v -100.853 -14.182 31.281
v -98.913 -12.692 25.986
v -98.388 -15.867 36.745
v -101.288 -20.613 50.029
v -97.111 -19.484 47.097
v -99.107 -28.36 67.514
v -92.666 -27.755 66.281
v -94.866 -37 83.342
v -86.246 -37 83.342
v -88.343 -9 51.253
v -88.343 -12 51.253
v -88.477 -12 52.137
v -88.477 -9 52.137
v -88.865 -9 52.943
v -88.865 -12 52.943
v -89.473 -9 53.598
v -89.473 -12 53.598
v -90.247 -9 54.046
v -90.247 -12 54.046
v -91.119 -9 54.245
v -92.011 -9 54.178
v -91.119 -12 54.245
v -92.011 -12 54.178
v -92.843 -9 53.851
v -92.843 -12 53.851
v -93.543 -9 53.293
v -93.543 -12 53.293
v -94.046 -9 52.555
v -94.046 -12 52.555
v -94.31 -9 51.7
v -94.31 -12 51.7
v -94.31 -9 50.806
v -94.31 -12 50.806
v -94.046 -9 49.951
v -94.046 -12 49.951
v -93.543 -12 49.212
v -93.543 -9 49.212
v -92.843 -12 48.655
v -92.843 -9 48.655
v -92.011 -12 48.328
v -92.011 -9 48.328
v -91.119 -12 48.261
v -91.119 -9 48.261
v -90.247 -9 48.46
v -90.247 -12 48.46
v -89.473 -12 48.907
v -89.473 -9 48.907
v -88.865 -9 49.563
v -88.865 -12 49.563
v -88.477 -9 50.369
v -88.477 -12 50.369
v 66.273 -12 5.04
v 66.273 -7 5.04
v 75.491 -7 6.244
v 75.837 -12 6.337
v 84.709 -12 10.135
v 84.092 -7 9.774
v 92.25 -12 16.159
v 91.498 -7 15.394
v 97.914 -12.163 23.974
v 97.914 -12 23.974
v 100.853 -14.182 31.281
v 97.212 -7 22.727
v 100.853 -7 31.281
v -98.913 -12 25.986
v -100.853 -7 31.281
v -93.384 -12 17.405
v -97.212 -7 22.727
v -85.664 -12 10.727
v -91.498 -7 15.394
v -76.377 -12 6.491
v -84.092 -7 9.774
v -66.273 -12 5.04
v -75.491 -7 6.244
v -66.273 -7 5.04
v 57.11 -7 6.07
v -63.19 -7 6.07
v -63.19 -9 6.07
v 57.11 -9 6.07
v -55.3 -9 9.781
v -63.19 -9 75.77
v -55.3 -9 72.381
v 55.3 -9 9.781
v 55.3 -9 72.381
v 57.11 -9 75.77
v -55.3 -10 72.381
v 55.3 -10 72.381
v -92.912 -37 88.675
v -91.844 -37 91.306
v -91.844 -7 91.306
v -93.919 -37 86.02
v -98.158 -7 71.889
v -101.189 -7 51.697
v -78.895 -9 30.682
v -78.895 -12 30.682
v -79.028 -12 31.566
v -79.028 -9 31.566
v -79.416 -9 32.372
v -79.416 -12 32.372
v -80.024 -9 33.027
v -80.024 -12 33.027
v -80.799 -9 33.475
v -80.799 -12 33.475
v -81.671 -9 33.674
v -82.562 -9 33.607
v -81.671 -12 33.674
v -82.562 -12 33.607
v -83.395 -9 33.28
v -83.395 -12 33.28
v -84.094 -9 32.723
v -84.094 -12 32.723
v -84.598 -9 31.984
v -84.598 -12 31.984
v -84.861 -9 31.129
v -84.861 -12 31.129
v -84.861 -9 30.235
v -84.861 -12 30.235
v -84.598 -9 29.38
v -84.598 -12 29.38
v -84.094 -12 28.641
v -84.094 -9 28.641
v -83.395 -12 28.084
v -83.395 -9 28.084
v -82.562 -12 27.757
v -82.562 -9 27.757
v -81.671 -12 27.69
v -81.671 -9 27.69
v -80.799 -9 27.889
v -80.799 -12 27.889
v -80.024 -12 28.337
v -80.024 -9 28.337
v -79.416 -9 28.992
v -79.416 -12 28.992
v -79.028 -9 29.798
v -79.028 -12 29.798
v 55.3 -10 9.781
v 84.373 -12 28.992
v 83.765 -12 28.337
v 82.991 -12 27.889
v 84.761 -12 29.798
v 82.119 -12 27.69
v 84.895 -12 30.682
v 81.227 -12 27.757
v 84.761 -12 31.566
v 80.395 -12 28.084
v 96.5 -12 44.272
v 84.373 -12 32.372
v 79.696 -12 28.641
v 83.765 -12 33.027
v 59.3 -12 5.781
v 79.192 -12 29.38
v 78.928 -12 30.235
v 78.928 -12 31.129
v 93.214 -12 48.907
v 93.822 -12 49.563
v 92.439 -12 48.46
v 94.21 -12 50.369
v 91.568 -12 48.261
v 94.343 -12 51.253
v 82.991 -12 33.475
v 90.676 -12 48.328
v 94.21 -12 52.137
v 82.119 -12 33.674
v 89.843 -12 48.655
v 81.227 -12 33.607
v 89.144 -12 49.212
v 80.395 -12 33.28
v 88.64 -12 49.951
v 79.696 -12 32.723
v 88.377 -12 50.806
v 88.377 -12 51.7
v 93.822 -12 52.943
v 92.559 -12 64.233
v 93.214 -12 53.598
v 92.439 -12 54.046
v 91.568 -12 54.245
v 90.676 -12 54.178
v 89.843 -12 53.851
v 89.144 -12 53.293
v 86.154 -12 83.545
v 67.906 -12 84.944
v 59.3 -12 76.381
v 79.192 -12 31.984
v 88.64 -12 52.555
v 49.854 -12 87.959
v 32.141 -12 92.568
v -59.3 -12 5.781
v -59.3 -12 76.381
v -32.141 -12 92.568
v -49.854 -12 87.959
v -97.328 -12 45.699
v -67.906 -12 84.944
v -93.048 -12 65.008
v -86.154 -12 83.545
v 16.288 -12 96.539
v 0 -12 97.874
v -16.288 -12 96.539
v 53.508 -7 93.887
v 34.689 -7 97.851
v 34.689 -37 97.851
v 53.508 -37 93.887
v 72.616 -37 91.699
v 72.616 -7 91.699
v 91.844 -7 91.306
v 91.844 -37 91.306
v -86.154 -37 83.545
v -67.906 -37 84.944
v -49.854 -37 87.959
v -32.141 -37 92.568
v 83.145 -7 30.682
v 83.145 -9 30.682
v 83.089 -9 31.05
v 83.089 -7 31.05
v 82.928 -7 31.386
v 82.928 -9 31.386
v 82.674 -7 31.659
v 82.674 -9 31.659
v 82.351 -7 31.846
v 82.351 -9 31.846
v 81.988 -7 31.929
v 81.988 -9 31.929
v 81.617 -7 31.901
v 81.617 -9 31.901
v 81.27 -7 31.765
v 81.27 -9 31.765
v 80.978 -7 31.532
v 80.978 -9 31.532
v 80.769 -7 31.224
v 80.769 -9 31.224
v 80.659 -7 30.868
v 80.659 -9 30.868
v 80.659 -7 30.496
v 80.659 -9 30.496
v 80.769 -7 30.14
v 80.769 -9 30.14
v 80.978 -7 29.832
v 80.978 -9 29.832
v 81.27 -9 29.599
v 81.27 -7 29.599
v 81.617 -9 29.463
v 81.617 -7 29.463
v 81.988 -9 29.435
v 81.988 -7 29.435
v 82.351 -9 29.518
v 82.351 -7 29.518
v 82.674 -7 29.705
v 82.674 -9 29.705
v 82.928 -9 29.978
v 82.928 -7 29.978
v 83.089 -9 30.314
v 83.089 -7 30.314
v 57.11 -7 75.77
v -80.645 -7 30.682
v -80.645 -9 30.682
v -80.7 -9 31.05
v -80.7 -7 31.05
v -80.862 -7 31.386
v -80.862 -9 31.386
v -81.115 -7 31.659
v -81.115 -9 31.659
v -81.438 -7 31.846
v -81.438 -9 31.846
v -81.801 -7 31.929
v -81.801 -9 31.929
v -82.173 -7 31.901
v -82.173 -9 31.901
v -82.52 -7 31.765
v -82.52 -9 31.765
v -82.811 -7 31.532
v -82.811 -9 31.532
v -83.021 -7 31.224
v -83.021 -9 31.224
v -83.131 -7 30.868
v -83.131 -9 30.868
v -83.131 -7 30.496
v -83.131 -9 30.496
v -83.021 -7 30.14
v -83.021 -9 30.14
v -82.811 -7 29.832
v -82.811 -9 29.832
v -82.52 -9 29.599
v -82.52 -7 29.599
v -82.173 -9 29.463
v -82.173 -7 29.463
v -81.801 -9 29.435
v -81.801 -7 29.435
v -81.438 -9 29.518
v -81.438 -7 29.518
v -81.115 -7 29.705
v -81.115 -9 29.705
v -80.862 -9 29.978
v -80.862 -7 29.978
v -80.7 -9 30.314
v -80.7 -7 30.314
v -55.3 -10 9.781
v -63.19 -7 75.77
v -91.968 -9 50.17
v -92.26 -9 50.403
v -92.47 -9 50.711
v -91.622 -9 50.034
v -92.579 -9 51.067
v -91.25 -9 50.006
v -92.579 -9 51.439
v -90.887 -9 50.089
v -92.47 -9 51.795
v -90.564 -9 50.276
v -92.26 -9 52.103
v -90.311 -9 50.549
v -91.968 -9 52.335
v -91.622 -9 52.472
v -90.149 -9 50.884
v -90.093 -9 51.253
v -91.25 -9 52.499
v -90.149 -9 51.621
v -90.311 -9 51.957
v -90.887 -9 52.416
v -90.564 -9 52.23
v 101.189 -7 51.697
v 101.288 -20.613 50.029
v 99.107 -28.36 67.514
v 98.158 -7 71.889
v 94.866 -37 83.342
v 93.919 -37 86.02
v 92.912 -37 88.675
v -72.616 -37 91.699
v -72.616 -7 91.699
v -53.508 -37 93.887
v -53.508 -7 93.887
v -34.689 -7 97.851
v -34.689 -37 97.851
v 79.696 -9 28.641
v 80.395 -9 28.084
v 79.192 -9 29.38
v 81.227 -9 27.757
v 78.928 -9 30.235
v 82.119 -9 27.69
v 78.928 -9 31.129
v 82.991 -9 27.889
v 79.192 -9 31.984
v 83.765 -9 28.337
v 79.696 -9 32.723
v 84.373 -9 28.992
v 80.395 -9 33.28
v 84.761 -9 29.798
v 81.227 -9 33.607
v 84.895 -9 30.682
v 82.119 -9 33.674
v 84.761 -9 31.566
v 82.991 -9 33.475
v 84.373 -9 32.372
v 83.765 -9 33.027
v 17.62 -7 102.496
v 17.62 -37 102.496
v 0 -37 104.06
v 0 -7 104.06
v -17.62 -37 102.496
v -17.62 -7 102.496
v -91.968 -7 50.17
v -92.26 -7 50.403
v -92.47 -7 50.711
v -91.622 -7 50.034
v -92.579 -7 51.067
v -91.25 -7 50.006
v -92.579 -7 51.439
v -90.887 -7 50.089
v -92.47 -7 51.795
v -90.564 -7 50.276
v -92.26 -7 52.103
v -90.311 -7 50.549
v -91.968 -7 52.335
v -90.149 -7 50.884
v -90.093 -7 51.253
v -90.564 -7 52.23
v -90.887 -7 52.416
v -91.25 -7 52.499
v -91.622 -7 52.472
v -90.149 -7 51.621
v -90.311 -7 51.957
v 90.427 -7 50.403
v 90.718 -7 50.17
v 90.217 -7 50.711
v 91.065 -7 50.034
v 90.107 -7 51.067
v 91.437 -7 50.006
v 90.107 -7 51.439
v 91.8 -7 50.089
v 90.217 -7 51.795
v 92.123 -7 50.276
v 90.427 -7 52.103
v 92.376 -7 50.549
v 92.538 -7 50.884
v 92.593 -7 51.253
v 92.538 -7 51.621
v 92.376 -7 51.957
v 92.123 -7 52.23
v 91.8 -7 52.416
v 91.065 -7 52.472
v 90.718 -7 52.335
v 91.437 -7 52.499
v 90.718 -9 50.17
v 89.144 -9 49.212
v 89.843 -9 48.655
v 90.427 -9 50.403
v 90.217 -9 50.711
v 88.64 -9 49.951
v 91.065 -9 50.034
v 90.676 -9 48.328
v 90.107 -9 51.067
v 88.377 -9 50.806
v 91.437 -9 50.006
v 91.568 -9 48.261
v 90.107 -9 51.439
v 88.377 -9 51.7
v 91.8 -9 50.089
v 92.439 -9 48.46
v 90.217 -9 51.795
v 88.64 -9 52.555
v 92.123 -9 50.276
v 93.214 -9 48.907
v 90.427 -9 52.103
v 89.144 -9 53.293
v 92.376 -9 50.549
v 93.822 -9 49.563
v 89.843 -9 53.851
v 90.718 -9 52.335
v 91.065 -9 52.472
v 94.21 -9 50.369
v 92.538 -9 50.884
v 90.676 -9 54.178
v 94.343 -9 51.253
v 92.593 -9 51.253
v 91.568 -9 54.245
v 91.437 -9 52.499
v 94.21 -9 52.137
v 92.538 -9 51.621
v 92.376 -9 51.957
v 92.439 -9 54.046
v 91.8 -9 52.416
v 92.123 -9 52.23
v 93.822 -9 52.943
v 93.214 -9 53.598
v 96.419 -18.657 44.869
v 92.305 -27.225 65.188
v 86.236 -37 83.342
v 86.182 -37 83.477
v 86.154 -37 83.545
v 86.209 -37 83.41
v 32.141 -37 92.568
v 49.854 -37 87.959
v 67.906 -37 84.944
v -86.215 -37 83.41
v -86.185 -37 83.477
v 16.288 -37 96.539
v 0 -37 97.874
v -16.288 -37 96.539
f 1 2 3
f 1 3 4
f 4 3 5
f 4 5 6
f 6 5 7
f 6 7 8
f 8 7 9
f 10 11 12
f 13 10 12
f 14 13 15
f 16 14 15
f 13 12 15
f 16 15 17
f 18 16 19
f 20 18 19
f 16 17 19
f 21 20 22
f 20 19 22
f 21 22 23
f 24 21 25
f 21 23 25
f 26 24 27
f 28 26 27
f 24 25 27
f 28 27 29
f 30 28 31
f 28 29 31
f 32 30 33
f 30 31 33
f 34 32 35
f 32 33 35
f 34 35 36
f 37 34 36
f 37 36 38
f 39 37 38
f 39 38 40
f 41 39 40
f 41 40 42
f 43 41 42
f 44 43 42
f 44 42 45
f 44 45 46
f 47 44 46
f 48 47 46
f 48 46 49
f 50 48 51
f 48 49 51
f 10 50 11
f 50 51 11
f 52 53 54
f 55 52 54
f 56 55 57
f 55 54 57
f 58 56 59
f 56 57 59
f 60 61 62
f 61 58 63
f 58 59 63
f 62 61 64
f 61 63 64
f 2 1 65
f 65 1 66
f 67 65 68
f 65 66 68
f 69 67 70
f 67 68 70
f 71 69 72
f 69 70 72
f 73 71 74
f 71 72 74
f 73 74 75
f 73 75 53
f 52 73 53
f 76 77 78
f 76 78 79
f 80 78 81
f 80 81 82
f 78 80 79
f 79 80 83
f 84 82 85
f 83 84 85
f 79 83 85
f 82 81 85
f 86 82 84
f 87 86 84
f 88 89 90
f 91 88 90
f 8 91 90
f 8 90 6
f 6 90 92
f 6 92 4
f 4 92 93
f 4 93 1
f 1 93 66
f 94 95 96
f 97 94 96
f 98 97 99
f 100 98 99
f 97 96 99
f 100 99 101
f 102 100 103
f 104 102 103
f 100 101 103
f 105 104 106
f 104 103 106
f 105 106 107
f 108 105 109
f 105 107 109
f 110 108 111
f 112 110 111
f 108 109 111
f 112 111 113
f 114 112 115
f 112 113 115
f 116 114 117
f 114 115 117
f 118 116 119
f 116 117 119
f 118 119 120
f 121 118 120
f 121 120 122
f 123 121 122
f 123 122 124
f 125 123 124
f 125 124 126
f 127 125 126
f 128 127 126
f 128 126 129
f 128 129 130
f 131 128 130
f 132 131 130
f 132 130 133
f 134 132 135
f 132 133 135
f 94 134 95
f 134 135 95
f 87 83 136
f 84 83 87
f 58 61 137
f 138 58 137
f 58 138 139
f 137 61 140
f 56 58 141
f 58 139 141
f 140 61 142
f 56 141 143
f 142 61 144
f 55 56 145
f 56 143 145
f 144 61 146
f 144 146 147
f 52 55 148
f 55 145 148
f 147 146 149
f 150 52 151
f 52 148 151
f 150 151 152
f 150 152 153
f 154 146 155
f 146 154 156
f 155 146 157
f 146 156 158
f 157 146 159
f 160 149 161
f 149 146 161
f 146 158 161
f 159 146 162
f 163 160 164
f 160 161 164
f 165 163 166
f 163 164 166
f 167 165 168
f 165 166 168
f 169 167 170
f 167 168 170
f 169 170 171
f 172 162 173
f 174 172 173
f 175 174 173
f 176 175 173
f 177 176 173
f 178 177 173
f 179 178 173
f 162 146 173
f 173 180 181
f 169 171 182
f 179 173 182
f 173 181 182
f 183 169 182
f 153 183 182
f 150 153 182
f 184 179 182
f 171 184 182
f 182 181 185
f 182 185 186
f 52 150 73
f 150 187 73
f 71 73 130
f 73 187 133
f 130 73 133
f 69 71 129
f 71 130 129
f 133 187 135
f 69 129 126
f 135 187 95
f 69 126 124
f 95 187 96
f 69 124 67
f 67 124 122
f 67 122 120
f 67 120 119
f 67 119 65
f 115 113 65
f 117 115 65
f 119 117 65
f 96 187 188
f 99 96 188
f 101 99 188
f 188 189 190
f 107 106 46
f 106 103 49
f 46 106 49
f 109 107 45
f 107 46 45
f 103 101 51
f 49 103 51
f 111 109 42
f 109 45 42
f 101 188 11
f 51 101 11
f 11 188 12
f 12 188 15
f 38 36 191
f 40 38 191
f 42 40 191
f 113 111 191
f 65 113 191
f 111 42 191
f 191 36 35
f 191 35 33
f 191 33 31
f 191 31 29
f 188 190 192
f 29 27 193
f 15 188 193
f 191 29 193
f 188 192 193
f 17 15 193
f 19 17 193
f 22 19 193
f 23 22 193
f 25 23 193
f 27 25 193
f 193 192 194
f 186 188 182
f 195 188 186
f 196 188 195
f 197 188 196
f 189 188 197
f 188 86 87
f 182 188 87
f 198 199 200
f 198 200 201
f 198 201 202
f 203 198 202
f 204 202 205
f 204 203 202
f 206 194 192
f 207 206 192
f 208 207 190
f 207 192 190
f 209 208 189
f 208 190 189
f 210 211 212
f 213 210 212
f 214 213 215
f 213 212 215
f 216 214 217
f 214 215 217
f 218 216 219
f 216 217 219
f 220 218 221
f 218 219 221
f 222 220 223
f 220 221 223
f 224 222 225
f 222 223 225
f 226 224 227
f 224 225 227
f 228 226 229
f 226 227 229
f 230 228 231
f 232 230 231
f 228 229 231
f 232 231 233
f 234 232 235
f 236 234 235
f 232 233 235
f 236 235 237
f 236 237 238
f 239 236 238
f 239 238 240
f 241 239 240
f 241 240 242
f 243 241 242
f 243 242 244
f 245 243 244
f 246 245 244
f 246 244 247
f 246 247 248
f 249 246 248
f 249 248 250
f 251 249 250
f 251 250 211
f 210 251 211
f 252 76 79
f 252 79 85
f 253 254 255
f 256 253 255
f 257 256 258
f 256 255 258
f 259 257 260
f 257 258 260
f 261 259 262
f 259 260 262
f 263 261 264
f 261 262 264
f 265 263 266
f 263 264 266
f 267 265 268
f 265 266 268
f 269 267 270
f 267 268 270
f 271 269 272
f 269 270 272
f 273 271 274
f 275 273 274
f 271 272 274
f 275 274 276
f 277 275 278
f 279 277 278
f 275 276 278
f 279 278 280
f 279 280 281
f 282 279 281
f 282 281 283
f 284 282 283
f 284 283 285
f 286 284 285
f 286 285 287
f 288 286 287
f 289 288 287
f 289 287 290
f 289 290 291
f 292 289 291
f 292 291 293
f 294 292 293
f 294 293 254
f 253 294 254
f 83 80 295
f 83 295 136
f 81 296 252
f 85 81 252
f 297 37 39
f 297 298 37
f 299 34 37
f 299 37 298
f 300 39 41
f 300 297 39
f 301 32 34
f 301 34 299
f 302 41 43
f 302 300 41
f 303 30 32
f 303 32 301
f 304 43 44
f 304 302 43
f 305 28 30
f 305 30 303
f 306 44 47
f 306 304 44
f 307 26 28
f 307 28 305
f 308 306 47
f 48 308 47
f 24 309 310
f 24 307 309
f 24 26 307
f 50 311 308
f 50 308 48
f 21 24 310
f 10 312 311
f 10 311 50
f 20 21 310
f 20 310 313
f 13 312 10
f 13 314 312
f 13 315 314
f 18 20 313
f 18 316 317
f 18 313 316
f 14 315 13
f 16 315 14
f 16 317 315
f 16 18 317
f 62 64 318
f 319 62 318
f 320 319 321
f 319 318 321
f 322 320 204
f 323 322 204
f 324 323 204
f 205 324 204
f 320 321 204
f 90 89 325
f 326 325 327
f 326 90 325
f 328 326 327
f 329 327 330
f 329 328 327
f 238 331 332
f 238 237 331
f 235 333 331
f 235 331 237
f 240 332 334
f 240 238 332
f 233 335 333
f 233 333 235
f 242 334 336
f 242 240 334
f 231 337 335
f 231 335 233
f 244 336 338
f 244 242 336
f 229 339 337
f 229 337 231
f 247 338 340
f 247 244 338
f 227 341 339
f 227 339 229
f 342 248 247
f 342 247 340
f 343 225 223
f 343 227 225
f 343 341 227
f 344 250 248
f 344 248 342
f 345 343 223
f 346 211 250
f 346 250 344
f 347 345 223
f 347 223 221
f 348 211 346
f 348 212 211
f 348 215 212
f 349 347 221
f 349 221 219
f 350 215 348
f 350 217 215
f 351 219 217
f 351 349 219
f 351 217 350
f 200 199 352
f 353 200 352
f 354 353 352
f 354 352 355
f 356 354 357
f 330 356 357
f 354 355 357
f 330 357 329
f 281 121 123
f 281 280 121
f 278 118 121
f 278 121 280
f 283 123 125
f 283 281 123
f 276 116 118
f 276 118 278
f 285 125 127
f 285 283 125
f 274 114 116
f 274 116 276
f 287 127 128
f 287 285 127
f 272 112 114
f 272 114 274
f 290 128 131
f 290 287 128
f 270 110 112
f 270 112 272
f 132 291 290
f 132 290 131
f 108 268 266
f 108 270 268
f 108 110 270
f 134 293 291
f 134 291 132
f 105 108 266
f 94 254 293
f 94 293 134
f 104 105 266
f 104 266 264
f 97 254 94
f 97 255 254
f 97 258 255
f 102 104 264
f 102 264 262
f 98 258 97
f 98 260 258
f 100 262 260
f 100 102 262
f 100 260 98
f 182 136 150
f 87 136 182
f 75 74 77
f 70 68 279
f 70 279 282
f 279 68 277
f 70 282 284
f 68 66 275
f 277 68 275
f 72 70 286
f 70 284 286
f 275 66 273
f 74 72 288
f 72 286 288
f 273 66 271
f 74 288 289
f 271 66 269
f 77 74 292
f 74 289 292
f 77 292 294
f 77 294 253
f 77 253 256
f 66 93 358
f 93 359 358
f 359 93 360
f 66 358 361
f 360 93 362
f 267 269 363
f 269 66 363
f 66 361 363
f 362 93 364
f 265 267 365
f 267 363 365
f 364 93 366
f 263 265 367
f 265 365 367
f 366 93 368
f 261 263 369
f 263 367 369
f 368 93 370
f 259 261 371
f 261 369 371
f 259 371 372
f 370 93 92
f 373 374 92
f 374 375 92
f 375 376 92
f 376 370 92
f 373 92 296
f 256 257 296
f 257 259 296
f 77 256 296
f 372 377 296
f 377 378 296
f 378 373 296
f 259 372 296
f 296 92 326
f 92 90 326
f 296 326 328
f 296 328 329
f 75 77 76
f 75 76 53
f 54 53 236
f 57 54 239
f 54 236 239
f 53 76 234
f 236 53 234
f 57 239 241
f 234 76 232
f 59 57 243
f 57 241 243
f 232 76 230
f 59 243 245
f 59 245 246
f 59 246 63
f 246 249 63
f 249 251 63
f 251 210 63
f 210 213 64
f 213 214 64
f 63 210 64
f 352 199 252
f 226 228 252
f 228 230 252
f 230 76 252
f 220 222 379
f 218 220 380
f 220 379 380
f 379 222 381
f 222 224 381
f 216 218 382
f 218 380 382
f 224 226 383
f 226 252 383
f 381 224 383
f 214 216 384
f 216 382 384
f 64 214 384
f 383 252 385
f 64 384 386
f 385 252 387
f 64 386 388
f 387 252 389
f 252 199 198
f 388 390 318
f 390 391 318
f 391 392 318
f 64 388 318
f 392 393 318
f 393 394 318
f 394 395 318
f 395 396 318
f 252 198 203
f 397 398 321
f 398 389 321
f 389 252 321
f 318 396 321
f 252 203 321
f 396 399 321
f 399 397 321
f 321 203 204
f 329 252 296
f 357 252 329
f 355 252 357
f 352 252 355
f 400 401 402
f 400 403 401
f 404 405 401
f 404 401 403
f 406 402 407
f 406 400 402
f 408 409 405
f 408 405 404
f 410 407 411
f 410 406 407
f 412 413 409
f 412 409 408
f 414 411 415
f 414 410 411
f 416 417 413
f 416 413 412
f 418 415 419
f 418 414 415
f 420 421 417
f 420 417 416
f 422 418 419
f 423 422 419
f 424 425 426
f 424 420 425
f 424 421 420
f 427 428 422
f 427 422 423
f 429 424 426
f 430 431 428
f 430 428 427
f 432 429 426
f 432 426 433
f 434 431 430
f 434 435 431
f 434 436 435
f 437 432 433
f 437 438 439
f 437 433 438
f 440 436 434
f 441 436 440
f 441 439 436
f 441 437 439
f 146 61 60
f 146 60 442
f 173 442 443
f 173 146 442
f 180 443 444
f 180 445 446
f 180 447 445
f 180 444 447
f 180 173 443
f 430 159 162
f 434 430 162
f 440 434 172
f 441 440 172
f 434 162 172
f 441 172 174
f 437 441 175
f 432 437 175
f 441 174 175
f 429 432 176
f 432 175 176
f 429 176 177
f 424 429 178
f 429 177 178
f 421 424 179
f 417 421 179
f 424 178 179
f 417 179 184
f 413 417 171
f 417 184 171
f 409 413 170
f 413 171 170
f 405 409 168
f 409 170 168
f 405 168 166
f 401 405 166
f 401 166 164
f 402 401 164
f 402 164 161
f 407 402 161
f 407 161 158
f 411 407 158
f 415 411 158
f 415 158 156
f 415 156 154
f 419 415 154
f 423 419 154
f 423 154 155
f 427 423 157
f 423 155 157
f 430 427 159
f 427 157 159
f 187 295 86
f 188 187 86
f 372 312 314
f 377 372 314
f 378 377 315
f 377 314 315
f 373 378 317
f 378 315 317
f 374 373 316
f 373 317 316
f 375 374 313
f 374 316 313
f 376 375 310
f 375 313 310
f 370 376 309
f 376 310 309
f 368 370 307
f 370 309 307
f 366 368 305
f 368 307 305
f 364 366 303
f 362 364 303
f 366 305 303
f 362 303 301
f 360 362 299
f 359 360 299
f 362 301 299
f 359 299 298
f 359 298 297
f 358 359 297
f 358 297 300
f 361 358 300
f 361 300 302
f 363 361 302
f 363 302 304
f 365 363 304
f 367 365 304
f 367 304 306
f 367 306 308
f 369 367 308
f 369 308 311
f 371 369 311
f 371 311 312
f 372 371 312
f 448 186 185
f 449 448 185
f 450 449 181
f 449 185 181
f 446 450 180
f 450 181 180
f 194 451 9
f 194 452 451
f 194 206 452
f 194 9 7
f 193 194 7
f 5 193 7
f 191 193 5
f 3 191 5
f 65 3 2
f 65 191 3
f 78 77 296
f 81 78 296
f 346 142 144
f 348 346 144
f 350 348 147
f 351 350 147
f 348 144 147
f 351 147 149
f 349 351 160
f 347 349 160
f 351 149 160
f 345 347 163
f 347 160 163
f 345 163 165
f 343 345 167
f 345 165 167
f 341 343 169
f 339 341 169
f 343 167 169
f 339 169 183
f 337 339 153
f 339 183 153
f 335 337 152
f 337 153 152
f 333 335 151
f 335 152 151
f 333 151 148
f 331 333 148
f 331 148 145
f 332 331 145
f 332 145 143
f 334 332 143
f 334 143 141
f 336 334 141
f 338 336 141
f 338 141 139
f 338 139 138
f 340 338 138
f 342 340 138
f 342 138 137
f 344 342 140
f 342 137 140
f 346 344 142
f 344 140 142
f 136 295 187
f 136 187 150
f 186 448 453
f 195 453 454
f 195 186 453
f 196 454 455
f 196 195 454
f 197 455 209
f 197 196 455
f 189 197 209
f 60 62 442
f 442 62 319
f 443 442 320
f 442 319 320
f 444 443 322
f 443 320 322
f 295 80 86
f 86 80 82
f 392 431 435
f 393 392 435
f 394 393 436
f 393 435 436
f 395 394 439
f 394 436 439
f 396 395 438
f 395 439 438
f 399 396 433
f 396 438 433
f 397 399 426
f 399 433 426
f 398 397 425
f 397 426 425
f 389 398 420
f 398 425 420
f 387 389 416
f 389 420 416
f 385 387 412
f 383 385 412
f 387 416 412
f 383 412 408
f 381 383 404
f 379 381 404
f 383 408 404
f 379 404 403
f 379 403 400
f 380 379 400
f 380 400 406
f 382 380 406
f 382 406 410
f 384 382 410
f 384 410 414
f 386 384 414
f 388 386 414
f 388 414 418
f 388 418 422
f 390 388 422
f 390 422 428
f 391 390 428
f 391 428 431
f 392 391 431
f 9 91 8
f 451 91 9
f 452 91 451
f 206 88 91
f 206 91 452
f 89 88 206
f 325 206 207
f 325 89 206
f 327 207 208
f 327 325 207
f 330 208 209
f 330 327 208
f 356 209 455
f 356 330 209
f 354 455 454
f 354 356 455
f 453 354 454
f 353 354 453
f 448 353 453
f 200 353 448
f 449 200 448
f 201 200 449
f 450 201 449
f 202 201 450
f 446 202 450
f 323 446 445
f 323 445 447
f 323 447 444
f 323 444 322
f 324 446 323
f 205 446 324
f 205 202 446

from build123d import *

# Parameters (mm, degrees)
PAD023_DEPTH     = 30
POCKET022_DEPTH  = 203.460811
POCKET023_DEPTH  = 25.001
SKETCH049_W      = 110.6
SKETCH049_H      = 62.6
POCKET024_DEPTH  = 33.001
SKETCH051_W      = 120.3
SKETCH051_H      = 69.7
POCKET025_DEPTH  = 2
CHAMFER001_SIZE2 = 2
CHAMFER001_SIZE  = 4
SKETCH054_R      = 1.25
POCKET029_DEPTH  = 7.001
SKETCH052_R      = 3
POCKET030_DEPTH  = 3


with BuildPart() as part:
    # Sketch045 → Pad023 (new body)
    with BuildSketch(Plane.XZ.offset(7)):
        with BuildLine():
            ThreePointArc((-100.852547, 31.281341), (-87.977329, 12.342987), (-66.272551, 5.039896))
            Line((-66.272551, 5.039896), (66.272551, 5.039896))
            ThreePointArc((66.272551, 5.039896), (87.977329, 12.342987), (100.852547, 31.281341))
            ThreePointArc((100.852547, 31.281341), (100.091262, 61.855424), (91.843705, 91.305923))
            ThreePointArc((34.688969, 97.850786), (63.036347, 92.569904), (91.843705, 91.305923))
            ThreePointArc((34.688969, 97.850786), (0, 104.060193), (-34.688969, 97.850786))
            ThreePointArc((-91.843705, 91.305923), (-63.036347, 92.569904), (-34.688969, 97.850786))
            ThreePointArc((-91.843705, 91.305923), (-100.091262, 61.855424), (-100.852547, 31.281341))
        make_face()
    extrude(amount=PAD023_DEPTH)

    # Sketch048 → Pocket022 (cut, through all)
    with BuildSketch(Plane.YZ.offset(102)):
        with BuildLine():
            ThreePointArc((-12, 23.34), (-23.12479, 56.152072), (-39.155961, 86.866801))
            Line((-39.155961, 23.34), (-39.155961, 86.866801))
            Line((-39.155961, 23.34), (-12, 23.34))
        make_face()
    extrude(amount=-POCKET022_DEPTH, mode=Mode.SUBTRACT)

    # Sketch050 → Pocket023 (cut, through all)
    with BuildSketch(Plane.XZ.offset(12)):
        with BuildLine():
            ThreePointArc((-86.154363, 83.544791), (-58.846051, 86.250597), (-32.141142, 92.568282))
            ThreePointArc((32.141142, 92.568282), (0, 97.874317), (-32.141142, 92.568282))
            ThreePointArc((32.141142, 92.568282), (58.846051, 86.250597), (86.154363, 83.544791))
            ThreePointArc((93.603594, -14.330003), (97.449111, 35.183555), (86.154363, 83.544791))
            Line((-93.603594, -14.330003), (93.603594, -14.330003))
            ThreePointArc((-86.154363, 83.544791), (-98.508002, 35.264147), (-93.603594, -14.330003))
        make_face()
    extrude(amount=POCKET023_DEPTH, mode=Mode.SUBTRACT)

    # Sketch049 → Pocket024 (cut, through all)
    with BuildSketch(Plane.XZ.offset(4)):
        with Locations((0, 41.080998)):
            Rectangle(SKETCH049_W, SKETCH049_H)
    extrude(amount=POCKET024_DEPTH, mode=Mode.SUBTRACT)

    # Sketch051 → Pocket025 (cut)
    with BuildSketch(Plane(origin=(0, -7, 41), x_dir=(1, 0, 0), z_dir=(0, -1, 0))):
        with Locations((-3.04, -0.08)):
            Rectangle(SKETCH051_W, SKETCH051_H)
    extrude(amount=POCKET025_DEPTH, mode=Mode.SUBTRACT)

    # Chamfer001
    chamfer001_edges = [part.edges().sort_by_distance(p)[0] for p in [
        (55.3, -12, 41.080998),
        (0, -12, 72.380998),
        (-55.3, -12, 41.080998),
        (0, -12, 9.780998),
    ]]
    chamfer001_side = part.faces().sort_by_distance((-83.299387, -12, 11.829323))[0]
    chamfer(chamfer001_edges, length=CHAMFER001_SIZE, length2=CHAMFER001_SIZE2, reference=chamfer001_side)

    # Sketch054 → Pocket029 (cut, through all)
    with BuildSketch(Plane.XZ.offset(14)):
        with Locations((-81.894745, 30.682003)):
            Circle(SKETCH054_R)
        with Locations((-91.343391, 51.252899)):
            Circle(SKETCH054_R)
        with Locations((91.343391, 51.252899)):
            Circle(SKETCH054_R)
        with Locations((81.894745, 30.682003)):
            Circle(SKETCH054_R)
    extrude(amount=-POCKET029_DEPTH, mode=Mode.SUBTRACT)

    # Sketch052 → Pocket030 (cut)
    with BuildSketch(Plane.XZ.offset(12)):
        with Locations((-81.894745, 30.682003)):
            Circle(SKETCH052_R)
        with Locations((81.894745, 30.682003)):
            Circle(SKETCH052_R)
        with Locations((91.343391, 51.252899)):
            Circle(SKETCH052_R)
        with Locations((-91.343391, 51.252899)):
            Circle(SKETCH052_R)
    extrude(amount=-POCKET030_DEPTH, mode=Mode.SUBTRACT)


solid = part.part
